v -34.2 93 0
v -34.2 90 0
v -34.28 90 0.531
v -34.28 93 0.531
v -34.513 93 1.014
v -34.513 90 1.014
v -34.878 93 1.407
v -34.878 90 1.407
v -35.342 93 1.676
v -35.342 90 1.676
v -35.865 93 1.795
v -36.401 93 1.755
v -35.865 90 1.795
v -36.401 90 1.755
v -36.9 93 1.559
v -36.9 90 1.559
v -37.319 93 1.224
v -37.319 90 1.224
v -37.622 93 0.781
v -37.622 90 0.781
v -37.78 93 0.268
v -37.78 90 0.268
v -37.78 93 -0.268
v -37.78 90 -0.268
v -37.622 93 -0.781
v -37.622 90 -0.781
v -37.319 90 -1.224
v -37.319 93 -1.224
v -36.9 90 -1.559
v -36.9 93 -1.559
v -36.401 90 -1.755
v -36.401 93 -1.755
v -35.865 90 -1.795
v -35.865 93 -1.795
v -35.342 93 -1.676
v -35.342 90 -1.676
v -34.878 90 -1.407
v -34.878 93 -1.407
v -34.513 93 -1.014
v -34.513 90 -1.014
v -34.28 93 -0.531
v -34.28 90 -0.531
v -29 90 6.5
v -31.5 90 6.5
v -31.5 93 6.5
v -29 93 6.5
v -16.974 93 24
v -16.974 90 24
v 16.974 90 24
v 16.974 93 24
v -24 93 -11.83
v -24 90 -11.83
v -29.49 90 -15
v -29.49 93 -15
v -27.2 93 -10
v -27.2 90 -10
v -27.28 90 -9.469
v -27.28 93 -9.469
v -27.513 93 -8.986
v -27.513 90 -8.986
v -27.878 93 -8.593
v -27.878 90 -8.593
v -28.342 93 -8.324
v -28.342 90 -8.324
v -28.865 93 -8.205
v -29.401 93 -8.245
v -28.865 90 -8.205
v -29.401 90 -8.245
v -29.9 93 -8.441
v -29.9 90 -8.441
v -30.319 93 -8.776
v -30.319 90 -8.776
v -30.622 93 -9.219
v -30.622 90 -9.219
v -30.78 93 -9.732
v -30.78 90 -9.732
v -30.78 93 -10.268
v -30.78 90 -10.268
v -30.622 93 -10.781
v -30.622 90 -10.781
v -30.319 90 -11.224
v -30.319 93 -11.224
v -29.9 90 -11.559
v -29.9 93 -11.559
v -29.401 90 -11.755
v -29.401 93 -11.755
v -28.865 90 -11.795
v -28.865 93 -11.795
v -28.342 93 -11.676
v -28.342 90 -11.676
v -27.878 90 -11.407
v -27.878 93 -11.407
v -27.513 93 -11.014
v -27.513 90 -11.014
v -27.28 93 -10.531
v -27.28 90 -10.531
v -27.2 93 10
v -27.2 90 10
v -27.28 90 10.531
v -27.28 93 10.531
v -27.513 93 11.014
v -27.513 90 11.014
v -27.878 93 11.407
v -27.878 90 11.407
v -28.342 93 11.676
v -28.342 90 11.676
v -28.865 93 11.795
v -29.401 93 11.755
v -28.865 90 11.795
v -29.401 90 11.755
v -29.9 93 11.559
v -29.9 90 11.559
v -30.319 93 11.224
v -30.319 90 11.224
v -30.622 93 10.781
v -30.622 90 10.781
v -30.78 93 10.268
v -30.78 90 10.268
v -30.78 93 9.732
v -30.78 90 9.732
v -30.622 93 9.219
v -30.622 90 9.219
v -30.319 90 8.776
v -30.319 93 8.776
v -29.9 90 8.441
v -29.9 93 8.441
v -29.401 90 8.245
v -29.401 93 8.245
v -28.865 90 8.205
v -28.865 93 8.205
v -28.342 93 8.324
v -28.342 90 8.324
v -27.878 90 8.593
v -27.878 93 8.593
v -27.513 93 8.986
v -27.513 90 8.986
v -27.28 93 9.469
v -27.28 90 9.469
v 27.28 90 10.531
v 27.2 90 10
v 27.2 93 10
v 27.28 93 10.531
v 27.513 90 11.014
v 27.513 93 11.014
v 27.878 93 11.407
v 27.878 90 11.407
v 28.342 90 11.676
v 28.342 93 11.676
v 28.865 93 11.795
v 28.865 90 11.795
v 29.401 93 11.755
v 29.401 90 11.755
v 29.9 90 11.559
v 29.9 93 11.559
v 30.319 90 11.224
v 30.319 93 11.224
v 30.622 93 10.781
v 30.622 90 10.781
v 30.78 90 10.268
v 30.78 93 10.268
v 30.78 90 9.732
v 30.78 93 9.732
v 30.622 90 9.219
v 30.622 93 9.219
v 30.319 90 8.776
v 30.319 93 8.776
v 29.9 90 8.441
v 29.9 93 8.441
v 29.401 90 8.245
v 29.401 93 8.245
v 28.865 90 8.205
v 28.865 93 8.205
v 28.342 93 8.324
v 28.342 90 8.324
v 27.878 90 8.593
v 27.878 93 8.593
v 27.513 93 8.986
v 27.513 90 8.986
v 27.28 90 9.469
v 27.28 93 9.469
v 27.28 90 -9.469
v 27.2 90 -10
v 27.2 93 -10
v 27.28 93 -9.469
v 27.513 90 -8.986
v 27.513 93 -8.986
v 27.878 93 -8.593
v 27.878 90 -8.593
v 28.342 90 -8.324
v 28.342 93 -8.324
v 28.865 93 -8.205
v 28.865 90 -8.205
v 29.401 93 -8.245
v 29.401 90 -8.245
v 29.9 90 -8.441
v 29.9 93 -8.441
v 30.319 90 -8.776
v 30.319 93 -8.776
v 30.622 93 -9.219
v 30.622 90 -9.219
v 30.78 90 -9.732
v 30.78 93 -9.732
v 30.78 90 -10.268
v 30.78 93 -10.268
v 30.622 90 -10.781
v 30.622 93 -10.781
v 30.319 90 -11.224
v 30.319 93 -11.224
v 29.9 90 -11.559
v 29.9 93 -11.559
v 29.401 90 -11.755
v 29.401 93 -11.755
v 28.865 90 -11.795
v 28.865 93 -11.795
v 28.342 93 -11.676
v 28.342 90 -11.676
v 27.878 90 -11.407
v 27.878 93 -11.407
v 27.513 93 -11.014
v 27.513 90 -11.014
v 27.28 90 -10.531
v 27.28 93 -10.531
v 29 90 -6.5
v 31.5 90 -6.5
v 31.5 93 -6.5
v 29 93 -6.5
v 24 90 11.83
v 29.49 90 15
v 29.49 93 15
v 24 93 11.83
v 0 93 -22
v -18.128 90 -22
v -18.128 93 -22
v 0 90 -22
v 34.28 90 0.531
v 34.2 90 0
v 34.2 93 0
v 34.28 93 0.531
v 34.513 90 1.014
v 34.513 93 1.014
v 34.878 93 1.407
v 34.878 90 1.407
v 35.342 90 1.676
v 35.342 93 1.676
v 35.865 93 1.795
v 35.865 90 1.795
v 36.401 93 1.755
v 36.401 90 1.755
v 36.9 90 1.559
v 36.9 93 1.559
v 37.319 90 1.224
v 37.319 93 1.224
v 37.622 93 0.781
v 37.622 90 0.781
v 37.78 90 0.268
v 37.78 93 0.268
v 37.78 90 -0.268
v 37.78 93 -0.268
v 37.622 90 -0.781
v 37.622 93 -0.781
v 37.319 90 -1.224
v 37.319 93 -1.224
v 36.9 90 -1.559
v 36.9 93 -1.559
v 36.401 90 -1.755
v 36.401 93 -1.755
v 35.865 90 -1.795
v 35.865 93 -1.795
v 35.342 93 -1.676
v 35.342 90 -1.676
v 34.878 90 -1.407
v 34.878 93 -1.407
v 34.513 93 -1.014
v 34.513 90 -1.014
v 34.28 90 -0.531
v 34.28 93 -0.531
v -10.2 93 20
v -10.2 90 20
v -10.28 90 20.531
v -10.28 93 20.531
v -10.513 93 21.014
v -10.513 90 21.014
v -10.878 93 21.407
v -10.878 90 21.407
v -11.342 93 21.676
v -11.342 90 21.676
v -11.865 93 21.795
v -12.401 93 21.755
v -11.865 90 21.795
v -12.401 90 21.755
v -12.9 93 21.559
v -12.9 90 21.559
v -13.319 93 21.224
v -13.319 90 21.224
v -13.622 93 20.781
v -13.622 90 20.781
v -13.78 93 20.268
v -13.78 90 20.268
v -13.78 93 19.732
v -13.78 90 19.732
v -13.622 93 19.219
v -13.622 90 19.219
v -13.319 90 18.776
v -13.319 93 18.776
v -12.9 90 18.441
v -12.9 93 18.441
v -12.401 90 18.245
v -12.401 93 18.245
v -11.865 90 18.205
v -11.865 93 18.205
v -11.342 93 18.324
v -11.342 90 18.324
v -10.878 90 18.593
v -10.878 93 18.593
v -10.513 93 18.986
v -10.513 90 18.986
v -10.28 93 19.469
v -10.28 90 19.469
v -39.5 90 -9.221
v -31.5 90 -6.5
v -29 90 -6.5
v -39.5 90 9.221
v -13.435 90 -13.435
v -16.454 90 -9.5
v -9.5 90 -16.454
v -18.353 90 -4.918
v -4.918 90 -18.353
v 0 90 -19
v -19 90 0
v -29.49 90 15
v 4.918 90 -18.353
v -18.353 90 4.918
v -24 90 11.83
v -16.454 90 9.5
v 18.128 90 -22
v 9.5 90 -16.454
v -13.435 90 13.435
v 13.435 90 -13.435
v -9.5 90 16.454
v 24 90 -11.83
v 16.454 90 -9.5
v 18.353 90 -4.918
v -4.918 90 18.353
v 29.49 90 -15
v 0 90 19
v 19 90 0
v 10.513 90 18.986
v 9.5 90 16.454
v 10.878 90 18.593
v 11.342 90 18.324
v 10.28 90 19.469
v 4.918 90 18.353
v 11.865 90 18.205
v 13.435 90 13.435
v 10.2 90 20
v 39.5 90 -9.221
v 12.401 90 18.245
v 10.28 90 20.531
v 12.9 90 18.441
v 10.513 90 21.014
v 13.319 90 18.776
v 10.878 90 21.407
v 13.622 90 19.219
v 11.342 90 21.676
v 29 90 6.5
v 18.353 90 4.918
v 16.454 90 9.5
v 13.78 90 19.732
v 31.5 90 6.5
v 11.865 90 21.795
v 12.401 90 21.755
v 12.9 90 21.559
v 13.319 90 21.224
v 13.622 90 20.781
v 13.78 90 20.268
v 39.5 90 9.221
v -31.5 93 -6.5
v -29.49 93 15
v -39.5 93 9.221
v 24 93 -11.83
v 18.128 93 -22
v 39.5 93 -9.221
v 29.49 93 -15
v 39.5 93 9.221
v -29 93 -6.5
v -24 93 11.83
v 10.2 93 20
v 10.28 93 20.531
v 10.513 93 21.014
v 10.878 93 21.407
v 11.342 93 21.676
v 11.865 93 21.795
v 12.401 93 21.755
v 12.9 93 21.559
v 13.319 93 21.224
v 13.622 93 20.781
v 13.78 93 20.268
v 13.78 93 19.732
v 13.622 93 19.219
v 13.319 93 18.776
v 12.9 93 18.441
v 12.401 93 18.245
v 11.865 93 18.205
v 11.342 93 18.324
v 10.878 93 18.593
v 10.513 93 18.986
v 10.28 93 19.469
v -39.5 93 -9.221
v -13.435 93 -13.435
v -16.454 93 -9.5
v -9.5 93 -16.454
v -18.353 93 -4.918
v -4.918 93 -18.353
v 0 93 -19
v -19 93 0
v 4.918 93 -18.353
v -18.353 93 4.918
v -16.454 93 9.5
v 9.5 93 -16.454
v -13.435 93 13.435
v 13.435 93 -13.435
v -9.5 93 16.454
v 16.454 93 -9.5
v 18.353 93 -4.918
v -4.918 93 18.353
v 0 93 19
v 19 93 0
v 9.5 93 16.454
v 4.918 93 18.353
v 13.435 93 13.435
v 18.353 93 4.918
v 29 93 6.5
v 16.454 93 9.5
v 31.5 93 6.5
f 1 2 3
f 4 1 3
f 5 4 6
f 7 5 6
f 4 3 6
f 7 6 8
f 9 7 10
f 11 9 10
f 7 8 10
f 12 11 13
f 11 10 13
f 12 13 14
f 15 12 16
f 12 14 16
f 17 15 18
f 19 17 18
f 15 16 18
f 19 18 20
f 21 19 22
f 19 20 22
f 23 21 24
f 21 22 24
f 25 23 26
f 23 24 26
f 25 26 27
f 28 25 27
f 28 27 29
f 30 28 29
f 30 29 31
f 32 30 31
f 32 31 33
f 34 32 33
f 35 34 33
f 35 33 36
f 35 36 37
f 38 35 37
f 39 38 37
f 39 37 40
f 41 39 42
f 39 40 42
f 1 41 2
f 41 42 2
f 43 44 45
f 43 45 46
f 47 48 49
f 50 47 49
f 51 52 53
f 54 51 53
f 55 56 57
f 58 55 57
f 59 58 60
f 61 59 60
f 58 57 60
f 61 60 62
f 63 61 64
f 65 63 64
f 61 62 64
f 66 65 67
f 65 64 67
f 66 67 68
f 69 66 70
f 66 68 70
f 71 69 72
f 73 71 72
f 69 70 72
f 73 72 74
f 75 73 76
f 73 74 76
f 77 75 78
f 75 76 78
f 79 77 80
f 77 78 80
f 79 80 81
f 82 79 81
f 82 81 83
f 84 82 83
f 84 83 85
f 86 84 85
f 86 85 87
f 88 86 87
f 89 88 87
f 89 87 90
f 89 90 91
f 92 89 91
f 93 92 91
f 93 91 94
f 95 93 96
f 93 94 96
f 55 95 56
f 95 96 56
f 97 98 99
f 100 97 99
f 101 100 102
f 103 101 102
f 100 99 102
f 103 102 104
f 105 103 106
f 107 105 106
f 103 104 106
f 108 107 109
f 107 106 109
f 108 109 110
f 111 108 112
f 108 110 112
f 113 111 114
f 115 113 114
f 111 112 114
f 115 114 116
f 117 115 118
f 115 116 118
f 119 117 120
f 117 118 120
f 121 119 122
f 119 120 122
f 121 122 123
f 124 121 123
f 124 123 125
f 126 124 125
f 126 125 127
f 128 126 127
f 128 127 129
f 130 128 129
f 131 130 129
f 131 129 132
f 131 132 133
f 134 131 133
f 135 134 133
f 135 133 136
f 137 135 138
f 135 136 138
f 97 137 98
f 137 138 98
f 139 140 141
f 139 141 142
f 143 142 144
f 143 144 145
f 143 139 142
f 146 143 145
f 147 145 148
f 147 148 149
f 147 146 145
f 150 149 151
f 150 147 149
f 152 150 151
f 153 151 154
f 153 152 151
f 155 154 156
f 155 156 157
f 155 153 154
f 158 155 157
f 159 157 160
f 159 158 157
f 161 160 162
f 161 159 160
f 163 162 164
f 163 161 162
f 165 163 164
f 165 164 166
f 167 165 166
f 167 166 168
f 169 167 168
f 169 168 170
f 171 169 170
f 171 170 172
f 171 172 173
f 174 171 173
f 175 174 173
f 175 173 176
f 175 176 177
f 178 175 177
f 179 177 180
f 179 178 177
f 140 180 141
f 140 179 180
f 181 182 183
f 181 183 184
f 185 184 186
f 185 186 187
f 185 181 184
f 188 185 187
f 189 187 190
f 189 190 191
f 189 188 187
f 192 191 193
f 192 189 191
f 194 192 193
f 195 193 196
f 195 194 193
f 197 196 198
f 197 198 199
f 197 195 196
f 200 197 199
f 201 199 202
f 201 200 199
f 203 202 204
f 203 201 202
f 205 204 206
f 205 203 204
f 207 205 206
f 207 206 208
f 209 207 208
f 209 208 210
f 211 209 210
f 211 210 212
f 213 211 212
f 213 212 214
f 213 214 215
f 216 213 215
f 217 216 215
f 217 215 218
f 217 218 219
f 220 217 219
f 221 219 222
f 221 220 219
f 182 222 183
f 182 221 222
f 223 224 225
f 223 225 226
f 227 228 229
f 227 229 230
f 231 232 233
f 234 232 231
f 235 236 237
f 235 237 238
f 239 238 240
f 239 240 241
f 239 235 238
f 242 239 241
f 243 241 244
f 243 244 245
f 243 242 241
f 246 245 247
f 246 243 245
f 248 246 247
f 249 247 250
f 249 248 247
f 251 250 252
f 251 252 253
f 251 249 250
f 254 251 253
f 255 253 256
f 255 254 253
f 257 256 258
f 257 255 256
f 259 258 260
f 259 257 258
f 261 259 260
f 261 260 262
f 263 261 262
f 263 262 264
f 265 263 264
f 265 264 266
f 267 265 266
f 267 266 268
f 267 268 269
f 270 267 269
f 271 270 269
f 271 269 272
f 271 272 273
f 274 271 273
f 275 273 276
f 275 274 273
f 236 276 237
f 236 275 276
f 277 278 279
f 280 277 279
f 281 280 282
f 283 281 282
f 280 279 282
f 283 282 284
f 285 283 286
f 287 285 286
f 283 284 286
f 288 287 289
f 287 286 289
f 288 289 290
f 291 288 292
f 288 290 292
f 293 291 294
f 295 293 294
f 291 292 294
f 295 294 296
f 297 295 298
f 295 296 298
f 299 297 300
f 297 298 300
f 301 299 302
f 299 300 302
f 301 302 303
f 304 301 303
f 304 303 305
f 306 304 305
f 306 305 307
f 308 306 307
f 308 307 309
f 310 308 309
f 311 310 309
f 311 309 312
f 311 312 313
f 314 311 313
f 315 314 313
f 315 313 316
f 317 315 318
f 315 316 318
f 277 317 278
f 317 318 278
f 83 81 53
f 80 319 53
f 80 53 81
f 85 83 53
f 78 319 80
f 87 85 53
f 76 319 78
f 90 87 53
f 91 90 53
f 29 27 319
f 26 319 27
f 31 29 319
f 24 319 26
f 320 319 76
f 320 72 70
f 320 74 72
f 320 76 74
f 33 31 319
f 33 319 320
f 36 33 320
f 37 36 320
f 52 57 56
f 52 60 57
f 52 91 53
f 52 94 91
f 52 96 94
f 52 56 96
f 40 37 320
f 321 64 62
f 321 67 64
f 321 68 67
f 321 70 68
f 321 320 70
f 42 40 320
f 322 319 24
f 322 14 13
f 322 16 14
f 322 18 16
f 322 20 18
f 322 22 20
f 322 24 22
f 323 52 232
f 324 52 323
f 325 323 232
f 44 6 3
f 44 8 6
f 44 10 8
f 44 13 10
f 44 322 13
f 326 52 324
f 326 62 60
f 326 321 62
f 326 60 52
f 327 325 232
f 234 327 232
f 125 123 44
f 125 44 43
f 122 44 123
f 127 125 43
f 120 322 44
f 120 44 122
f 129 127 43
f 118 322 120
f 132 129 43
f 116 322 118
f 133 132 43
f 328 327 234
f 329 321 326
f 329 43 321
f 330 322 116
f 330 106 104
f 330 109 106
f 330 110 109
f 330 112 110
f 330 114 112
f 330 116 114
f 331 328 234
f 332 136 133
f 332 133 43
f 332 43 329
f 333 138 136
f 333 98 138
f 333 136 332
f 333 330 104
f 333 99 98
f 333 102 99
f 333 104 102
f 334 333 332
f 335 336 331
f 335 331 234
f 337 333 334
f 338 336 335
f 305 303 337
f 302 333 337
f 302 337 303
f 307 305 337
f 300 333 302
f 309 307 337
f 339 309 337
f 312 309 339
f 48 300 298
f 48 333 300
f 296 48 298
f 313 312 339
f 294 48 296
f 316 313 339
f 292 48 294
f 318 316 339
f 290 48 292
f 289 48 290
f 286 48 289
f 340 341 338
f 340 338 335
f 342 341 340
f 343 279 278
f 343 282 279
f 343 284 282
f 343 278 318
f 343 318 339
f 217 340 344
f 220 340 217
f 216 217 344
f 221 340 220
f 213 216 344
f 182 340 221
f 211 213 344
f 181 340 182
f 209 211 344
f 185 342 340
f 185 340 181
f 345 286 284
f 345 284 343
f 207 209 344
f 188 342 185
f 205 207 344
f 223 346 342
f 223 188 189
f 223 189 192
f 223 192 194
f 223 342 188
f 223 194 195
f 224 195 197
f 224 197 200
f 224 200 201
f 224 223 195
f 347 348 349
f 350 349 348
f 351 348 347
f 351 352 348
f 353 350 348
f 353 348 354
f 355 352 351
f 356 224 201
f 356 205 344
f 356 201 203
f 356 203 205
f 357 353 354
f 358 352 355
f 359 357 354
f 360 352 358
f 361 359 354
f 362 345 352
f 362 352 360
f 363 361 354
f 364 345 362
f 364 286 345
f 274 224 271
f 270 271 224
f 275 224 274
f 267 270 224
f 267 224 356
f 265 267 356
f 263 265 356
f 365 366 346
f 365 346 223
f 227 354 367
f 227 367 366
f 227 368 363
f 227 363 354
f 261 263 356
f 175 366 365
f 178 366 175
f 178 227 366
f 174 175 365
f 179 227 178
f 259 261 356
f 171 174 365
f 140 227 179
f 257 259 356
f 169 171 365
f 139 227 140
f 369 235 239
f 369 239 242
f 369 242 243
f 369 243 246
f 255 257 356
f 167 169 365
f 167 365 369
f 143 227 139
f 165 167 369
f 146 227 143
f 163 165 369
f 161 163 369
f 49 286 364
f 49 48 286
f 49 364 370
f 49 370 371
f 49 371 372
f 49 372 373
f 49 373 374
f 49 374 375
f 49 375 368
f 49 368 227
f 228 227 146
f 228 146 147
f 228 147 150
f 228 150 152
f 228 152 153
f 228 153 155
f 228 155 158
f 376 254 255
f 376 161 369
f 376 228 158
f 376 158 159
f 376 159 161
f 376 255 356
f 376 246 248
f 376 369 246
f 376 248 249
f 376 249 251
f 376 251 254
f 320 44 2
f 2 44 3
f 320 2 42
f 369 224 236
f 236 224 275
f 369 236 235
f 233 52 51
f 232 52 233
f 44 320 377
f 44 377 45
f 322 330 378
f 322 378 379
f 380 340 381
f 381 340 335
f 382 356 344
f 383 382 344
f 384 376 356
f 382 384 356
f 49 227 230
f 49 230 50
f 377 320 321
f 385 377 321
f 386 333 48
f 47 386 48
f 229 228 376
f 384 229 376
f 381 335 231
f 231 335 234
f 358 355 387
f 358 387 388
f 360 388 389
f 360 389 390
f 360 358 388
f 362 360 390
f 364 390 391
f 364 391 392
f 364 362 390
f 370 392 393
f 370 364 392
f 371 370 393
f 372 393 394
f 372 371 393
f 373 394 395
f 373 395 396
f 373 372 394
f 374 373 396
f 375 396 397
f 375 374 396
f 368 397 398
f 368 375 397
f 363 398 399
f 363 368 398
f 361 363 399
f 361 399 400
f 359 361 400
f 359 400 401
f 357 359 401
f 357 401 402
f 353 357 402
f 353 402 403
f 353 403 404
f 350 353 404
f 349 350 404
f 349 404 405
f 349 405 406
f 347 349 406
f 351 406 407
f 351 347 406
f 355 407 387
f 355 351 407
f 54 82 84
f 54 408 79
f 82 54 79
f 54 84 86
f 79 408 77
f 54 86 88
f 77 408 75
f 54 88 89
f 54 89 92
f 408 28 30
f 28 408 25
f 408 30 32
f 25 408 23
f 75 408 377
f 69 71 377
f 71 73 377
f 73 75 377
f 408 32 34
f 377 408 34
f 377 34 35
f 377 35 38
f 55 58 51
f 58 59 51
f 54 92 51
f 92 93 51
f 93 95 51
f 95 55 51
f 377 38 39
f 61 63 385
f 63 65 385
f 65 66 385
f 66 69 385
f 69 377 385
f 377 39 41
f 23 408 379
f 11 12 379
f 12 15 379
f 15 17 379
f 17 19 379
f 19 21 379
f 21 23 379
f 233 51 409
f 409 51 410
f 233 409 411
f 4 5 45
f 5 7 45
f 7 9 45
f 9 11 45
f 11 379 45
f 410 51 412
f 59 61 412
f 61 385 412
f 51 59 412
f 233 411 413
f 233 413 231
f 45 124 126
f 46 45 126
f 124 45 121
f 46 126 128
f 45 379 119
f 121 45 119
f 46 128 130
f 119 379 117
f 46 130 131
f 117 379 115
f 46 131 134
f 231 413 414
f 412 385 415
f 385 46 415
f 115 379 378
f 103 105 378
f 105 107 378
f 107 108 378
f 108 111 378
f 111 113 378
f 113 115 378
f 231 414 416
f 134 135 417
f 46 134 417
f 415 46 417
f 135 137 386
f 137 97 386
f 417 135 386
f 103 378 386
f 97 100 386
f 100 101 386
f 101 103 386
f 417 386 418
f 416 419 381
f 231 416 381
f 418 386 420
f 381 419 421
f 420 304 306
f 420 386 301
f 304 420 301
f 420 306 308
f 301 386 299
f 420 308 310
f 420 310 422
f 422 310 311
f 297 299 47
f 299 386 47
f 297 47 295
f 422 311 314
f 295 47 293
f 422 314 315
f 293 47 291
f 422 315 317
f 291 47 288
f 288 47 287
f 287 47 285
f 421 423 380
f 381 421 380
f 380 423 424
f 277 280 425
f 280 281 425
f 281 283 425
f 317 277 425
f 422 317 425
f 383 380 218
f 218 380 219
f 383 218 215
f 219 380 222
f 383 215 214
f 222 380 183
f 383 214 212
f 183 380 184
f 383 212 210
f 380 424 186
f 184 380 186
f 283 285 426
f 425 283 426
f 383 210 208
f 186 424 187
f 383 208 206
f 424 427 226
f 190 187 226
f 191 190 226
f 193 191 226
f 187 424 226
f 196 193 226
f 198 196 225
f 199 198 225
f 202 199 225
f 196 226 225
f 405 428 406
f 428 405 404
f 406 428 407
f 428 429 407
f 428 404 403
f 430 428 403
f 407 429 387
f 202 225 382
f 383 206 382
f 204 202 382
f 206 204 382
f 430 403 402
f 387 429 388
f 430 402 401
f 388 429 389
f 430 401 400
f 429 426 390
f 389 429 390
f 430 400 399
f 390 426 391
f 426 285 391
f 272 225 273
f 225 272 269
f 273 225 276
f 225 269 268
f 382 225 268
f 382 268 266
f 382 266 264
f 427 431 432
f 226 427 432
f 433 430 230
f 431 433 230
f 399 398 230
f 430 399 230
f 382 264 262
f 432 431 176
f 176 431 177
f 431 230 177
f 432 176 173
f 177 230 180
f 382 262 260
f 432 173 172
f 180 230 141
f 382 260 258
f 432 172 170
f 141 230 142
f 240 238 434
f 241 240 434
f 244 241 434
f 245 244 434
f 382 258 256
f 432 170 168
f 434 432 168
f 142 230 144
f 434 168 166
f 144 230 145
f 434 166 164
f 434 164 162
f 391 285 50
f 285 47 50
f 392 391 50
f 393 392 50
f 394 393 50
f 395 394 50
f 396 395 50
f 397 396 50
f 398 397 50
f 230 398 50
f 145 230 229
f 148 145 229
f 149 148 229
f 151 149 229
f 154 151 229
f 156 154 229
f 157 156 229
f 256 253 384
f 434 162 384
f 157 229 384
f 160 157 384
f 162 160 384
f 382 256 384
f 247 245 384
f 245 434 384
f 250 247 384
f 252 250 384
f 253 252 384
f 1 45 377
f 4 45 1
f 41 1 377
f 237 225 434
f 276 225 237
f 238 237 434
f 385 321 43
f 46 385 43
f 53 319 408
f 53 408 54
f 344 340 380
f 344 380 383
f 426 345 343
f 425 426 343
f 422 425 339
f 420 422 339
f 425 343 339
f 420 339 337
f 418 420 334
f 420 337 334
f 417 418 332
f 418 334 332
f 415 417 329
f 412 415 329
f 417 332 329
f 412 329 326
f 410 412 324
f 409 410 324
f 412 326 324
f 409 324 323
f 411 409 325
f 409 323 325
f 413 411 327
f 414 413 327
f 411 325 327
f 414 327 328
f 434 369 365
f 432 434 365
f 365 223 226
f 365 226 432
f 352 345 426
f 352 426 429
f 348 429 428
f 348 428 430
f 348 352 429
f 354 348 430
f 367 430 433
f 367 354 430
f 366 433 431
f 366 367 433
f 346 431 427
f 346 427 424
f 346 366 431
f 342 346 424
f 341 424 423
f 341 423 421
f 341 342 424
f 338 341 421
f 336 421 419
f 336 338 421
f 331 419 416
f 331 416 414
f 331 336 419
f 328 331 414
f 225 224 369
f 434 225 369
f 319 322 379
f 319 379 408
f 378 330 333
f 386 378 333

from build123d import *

# Parameters (mm, degrees)
SKETCH141_R  = 1.8
SKETCH141_W  = 2.5
SKETCH141_H  = 13
PAD112_DEPTH = 3


with BuildPart() as motorcageendcap:
    # Sketch141 → Pad112 (new body)
    with BuildSketch(Plane.XZ.offset(-90)):
        with BuildLine():
            Line((-29.490381, 15), (-39.5, 9.220944))
            Line((-39.5, 9.220944), (-39.5, -9.220944))
            Line((-39.5, -9.220944), (-29.490381, -15))
            Line((-24, -11.830127), (-29.490381, -15))
            Line((-24, -11.830127), (-18.128421, -22))
            Line((-18.128421, -22), (0, -22))
            Line((0, -22), (0, -19))
            ThreePointArc((0, 19), (-19, 0), (0, -19))
            Line((0, 24), (0, 19))
            Line((-16.973721, 24), (0, 24))
            Line((-24, 11.830127), (-16.973721, 24))
            Line((-29.490381, 15), (-24, 11.830127))
        make_face()
        with Locations((-29, 10)):
            Circle(SKETCH141_R, mode=Mode.SUBTRACT)
        with Locations((-29, -10)):
            Circle(SKETCH141_R, mode=Mode.SUBTRACT)
        with Locations((-12, 20)):
            Circle(SKETCH141_R, mode=Mode.SUBTRACT)
        with Locations((-36, 0)):
            Circle(SKETCH141_R, mode=Mode.SUBTRACT)
        with Locations((-30.25, 0)):
            Rectangle(SKETCH141_W, SKETCH141_H, mode=Mode.SUBTRACT)
    extrude(amount=-PAD112_DEPTH)


with BuildPart() as fusion004020018:
    # Part__Mirroring007: instance of MotorCageEndCap
    add(motorcageendcap.part.mirror(Plane(origin=(0, 0, 0), x_dir=(0, -1, 0), z_dir=(1, 0, 0))))

    # Fusion004020018: union MotorCageEndCap
    add(motorcageendcap.part)


solid = fusion004020018.part
